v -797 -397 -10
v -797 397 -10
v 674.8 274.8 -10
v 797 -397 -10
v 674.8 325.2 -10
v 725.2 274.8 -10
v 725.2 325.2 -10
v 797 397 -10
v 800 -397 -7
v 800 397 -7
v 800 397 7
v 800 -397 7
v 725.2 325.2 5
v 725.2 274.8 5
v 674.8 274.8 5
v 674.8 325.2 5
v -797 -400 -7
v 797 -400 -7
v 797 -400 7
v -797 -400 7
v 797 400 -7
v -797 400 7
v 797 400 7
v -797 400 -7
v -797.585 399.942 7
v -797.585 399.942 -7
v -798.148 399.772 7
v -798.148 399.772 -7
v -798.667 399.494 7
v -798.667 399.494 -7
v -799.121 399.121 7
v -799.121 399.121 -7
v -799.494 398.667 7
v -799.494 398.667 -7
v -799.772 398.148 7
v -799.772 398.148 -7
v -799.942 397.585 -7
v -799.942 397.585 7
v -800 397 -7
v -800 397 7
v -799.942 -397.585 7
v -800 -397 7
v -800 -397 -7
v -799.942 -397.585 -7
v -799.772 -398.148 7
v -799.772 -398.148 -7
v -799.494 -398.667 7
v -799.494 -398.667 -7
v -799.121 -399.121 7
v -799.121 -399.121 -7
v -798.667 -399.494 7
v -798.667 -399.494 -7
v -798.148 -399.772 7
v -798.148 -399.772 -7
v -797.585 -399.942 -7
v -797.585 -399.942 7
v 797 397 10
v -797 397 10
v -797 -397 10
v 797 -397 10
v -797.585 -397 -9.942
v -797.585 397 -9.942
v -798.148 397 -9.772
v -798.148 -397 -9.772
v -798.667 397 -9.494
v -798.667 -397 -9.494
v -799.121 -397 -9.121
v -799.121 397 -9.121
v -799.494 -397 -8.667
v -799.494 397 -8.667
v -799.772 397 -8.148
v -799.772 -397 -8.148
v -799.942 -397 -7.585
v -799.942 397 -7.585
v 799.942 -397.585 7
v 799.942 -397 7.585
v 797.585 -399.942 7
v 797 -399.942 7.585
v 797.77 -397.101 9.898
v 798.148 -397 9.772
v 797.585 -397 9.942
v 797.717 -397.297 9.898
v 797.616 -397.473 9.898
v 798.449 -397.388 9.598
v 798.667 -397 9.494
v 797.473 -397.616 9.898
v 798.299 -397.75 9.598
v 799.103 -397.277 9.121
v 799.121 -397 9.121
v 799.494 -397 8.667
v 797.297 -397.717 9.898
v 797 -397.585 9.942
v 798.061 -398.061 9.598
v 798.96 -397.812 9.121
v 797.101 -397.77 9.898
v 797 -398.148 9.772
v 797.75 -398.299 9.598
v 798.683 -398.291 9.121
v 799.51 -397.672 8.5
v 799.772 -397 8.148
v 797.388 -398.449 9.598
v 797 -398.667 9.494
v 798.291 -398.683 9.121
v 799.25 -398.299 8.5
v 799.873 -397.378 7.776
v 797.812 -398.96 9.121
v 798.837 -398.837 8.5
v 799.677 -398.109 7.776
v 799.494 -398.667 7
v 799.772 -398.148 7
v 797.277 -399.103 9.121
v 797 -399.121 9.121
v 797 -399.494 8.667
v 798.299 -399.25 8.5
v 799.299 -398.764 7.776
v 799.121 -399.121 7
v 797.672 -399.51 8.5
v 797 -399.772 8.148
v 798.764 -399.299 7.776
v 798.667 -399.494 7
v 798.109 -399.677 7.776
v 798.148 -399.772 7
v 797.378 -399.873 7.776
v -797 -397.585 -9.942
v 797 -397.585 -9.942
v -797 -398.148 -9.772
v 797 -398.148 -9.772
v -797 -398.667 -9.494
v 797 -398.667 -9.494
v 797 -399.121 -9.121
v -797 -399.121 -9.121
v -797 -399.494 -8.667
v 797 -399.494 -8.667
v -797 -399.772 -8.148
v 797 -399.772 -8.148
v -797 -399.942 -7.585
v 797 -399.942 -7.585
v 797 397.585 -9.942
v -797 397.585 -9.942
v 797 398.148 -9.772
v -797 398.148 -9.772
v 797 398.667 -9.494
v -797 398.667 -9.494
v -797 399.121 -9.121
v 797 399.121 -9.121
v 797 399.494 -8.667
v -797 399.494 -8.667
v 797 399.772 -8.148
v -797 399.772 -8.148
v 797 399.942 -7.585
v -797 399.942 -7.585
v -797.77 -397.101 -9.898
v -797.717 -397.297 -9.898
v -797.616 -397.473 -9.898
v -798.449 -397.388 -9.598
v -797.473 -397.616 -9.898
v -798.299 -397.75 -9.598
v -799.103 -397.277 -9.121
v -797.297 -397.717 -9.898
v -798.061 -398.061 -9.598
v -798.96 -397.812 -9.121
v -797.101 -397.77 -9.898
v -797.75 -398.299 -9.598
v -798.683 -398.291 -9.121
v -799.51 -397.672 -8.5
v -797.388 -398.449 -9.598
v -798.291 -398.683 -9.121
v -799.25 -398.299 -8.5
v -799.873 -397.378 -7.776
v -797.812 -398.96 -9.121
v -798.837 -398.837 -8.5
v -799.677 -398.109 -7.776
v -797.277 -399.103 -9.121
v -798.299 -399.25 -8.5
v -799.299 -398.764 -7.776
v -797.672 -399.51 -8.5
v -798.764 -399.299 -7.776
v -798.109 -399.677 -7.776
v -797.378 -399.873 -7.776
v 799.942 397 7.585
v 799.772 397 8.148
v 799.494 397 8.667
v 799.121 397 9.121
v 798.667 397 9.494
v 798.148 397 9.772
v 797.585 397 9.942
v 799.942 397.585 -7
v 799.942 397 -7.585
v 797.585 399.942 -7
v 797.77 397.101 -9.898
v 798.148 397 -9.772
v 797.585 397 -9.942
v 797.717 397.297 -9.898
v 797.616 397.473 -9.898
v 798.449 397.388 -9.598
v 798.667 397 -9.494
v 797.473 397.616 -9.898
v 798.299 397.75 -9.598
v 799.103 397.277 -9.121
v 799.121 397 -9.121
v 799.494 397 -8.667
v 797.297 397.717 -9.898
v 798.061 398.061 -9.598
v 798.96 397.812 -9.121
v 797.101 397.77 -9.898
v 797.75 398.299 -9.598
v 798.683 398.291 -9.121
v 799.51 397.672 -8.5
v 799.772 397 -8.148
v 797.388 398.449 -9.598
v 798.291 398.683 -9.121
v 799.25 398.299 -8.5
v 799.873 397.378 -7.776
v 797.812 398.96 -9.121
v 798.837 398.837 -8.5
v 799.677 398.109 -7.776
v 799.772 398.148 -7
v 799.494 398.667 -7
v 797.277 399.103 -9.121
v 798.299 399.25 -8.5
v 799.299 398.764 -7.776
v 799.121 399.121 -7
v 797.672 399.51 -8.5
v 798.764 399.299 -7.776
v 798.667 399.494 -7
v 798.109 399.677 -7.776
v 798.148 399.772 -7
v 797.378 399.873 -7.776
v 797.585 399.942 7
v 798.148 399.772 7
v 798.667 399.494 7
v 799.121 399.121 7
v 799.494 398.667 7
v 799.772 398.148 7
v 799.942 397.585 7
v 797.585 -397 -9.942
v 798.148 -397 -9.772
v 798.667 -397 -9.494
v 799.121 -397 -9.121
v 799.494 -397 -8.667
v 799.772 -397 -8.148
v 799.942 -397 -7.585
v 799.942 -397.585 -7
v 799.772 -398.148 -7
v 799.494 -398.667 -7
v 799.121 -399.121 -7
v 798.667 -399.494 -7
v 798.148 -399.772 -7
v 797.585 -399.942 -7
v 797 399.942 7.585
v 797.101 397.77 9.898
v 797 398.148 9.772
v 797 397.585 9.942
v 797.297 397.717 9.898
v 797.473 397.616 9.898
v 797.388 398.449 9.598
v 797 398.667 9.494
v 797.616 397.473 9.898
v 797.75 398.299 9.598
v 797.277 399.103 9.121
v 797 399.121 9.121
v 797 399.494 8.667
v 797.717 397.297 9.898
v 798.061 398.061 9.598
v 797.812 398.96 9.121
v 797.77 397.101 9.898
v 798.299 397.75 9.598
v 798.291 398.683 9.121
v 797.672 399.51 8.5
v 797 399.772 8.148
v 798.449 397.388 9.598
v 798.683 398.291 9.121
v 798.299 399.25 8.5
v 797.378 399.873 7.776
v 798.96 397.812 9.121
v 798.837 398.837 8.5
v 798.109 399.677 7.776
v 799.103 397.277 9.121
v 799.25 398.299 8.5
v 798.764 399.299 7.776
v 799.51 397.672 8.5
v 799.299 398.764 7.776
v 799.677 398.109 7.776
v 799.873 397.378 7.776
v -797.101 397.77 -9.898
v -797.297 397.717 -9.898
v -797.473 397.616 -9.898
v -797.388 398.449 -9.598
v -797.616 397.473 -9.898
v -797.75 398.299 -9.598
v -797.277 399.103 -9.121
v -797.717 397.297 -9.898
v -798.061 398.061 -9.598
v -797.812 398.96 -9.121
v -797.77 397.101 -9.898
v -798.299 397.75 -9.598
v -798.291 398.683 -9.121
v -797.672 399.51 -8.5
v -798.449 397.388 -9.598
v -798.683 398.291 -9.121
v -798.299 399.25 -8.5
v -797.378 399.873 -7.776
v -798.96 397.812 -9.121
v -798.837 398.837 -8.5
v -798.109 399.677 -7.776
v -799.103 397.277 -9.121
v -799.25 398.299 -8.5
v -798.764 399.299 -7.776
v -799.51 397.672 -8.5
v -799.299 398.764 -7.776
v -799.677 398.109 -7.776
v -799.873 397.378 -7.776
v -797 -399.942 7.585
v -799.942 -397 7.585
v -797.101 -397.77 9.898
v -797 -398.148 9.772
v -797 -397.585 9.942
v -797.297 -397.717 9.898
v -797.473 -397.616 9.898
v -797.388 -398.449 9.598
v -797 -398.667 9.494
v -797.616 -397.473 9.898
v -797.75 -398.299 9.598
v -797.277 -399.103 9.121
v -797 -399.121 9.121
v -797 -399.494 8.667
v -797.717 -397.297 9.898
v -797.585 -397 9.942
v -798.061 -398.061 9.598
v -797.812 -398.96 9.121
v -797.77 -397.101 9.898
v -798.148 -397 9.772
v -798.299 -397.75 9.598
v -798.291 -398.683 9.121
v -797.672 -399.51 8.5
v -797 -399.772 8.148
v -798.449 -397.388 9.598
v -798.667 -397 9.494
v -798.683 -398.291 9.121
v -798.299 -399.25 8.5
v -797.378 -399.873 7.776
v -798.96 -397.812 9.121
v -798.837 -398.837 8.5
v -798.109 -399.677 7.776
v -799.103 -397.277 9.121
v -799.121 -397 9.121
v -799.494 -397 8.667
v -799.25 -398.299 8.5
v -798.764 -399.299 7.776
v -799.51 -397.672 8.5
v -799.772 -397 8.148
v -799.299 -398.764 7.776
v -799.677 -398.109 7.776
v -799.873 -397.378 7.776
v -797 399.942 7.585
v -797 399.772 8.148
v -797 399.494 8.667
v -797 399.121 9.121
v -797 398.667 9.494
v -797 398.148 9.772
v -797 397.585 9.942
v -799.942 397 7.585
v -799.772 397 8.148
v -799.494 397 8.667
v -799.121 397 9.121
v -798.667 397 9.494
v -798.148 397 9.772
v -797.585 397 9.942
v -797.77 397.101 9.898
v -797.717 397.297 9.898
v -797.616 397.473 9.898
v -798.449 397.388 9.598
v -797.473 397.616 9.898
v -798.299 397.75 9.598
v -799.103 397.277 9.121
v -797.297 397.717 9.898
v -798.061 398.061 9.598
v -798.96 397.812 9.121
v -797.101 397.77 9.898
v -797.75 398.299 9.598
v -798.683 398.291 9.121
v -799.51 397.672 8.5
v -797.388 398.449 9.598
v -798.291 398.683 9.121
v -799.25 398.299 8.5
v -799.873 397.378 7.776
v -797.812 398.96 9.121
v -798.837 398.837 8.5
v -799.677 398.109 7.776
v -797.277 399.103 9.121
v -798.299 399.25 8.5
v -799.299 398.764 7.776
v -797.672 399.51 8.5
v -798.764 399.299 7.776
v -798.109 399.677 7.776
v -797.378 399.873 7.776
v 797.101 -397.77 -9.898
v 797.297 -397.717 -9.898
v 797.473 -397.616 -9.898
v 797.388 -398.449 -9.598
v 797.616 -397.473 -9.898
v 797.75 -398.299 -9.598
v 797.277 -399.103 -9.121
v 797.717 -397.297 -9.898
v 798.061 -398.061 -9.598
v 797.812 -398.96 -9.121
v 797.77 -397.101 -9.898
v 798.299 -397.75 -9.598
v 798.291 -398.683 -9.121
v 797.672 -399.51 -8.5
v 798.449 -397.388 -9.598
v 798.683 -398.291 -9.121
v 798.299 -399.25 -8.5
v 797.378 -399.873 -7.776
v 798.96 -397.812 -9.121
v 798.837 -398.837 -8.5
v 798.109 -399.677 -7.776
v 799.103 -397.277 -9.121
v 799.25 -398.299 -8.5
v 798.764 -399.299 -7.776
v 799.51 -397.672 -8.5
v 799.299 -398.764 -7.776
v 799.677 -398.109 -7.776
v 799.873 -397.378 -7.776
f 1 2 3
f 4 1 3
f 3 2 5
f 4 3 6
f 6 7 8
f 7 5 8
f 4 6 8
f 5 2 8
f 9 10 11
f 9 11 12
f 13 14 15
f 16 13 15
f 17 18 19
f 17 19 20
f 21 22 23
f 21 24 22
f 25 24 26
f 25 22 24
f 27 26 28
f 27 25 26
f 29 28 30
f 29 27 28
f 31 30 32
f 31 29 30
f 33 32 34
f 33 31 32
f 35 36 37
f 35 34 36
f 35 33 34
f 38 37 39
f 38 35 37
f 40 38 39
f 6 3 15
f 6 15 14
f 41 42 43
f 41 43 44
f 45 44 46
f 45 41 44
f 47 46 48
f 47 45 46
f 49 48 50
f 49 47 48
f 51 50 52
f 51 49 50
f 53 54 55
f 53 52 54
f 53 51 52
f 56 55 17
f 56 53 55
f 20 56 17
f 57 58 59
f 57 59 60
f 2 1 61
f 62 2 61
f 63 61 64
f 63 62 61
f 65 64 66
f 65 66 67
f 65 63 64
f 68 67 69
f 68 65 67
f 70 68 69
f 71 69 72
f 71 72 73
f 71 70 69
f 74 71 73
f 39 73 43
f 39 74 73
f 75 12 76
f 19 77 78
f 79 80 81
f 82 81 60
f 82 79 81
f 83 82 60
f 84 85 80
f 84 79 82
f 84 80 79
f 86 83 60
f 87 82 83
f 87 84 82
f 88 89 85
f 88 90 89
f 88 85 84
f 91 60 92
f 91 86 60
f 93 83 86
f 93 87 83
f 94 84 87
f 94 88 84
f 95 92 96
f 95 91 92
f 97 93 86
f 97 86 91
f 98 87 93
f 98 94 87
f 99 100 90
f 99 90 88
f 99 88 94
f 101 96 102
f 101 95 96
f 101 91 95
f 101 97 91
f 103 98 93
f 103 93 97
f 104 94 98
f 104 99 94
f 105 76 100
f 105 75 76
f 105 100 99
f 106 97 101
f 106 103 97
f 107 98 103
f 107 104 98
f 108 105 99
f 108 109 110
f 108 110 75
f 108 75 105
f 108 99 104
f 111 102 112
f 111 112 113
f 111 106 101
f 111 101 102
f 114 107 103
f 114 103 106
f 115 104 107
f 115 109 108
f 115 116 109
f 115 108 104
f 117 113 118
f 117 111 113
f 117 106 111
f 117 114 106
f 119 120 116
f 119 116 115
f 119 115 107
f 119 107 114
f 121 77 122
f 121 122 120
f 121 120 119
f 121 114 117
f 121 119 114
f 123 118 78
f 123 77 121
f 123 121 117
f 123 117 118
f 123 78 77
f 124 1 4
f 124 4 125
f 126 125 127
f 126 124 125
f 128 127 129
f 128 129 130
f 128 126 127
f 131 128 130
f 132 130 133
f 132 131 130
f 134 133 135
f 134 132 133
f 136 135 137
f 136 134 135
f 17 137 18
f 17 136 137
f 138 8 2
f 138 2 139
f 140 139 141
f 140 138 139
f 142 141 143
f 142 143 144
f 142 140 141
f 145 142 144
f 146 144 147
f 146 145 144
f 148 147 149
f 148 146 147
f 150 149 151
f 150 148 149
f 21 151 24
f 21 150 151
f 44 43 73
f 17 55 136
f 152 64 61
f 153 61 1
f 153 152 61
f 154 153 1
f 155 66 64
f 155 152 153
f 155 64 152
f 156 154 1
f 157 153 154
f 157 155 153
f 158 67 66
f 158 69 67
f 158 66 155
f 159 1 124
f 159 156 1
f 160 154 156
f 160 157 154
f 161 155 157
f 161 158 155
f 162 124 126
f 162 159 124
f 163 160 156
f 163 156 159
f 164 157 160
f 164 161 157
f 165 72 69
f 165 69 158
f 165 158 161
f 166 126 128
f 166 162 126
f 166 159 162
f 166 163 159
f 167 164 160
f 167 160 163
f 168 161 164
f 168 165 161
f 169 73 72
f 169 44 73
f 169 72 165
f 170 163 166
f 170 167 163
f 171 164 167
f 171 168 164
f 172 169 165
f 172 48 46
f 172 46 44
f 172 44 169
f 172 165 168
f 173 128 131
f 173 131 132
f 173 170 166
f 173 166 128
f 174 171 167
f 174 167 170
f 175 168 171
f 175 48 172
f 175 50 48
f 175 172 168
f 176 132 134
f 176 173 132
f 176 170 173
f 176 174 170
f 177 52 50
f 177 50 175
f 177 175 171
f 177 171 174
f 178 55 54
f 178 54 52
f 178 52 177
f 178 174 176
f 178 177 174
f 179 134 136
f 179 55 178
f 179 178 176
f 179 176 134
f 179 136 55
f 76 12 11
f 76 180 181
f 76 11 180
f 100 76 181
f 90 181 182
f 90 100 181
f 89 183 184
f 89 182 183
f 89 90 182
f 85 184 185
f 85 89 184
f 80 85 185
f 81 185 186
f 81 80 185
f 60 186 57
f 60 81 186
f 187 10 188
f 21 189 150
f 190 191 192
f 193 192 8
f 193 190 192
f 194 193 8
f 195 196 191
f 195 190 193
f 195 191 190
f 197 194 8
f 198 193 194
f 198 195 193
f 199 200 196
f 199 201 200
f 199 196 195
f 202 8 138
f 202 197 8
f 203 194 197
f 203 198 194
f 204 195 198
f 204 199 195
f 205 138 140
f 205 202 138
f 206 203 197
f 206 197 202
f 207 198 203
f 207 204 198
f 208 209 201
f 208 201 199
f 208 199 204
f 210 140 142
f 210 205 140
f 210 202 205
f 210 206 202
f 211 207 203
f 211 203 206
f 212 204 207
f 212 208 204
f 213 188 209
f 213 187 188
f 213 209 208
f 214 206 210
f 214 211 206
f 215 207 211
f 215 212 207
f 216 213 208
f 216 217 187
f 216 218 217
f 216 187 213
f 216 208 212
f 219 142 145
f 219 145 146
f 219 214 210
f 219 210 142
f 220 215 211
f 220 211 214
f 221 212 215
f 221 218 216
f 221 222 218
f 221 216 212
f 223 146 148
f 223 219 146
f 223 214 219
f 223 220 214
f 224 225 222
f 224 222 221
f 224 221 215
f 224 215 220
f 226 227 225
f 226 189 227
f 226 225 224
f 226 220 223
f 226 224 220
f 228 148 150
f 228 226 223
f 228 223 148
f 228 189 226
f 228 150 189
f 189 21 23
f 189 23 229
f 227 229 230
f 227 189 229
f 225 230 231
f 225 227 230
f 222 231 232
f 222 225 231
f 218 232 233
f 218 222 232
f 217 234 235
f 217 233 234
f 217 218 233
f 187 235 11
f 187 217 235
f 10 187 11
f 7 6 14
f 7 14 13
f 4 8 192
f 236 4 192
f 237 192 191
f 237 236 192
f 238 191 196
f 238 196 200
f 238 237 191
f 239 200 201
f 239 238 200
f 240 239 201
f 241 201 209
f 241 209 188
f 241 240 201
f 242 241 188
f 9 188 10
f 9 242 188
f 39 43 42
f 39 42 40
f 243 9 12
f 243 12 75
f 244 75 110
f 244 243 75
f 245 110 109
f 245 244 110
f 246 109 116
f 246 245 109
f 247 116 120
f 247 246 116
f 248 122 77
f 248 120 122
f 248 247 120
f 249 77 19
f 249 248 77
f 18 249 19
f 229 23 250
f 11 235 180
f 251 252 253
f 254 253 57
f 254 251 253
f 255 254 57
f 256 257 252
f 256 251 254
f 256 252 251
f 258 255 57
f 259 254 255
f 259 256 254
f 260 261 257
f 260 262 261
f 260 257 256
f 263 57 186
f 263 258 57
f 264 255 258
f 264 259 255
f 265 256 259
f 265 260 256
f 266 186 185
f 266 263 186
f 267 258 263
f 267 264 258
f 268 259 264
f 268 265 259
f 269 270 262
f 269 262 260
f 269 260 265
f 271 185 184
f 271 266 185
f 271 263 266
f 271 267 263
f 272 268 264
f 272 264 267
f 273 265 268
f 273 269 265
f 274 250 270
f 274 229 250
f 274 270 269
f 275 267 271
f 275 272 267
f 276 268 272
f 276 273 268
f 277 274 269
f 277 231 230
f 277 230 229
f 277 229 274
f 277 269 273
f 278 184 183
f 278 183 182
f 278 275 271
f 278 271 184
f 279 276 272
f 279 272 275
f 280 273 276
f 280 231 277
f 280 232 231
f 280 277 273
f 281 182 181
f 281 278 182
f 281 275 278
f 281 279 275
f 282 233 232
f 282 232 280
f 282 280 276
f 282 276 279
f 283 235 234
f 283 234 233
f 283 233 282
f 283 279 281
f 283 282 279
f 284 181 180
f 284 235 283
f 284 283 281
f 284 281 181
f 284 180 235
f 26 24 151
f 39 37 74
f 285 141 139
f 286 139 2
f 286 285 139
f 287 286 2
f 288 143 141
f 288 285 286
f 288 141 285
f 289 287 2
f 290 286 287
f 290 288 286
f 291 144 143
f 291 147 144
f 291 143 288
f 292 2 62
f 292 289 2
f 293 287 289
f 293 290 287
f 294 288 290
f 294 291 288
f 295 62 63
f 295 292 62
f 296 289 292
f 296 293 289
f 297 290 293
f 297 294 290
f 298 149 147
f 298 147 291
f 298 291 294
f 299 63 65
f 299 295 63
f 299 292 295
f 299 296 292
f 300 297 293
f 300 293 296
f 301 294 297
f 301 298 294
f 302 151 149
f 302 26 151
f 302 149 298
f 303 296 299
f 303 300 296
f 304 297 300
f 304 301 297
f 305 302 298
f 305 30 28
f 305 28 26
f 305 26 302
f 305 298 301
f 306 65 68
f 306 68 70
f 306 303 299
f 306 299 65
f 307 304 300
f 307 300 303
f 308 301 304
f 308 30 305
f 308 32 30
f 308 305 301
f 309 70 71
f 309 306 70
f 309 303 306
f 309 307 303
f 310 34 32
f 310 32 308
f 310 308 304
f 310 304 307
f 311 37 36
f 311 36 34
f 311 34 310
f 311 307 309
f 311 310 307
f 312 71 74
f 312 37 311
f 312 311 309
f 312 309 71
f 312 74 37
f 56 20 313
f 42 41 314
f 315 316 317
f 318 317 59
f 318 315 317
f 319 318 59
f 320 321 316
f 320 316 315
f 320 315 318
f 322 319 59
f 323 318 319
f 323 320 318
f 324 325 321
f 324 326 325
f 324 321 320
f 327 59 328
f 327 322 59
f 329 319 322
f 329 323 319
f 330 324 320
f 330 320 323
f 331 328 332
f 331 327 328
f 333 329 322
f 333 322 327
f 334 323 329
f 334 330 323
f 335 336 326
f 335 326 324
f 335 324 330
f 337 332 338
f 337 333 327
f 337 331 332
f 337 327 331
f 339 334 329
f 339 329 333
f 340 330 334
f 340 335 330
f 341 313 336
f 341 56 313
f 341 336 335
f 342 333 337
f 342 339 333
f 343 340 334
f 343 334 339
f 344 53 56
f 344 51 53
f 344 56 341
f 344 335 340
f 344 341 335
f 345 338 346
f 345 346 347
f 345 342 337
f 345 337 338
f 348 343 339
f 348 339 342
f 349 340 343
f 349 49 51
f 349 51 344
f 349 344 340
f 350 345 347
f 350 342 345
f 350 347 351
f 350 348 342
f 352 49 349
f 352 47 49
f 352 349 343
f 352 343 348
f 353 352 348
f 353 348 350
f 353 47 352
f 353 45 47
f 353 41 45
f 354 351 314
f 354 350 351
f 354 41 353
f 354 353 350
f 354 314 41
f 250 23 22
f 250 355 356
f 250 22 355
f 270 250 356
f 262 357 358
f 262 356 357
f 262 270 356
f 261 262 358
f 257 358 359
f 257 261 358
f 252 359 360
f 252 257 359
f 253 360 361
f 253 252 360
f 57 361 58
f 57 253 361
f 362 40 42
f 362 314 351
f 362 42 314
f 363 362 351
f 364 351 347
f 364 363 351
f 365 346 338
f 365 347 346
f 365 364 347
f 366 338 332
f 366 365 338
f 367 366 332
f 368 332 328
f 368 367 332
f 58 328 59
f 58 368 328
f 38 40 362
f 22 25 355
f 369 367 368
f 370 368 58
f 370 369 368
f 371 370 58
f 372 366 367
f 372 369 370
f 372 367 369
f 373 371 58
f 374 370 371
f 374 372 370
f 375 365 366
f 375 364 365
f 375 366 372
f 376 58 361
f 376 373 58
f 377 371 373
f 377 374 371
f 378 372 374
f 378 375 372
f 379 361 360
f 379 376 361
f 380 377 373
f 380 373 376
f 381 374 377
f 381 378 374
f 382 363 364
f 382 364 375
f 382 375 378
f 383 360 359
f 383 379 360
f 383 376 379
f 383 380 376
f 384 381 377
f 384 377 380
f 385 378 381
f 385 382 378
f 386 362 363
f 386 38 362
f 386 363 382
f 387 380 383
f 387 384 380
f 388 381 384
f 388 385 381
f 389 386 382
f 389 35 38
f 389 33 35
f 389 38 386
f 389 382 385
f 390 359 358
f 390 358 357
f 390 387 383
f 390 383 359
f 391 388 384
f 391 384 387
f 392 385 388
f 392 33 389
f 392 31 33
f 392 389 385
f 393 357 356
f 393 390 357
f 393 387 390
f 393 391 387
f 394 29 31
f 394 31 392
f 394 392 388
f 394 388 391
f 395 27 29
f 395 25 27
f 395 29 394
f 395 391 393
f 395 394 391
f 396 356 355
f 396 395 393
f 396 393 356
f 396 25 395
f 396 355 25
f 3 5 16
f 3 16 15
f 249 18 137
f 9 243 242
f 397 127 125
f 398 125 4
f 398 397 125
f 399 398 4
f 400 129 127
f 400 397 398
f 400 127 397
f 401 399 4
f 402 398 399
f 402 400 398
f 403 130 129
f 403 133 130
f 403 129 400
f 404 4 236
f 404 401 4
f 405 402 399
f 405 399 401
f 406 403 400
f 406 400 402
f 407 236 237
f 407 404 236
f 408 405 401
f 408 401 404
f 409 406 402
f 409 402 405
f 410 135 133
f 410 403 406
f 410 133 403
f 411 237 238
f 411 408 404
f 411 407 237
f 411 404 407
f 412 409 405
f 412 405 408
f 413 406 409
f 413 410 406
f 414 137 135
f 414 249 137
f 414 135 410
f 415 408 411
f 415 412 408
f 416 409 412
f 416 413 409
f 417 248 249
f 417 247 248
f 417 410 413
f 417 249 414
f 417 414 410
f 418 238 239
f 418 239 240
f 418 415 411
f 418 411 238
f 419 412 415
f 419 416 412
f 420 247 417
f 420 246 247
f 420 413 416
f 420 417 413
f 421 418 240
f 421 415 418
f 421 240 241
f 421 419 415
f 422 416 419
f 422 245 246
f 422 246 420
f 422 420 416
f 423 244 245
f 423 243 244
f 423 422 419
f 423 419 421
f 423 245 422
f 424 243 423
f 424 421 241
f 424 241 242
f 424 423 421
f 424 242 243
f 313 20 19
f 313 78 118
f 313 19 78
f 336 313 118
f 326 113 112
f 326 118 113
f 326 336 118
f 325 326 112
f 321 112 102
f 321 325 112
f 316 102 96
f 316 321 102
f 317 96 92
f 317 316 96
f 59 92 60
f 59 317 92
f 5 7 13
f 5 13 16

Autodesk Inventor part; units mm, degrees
sketch "Tampo_sketch" plane through (0, 0, 0) normal (0, 0, 1) x (1, 0, 0)
  line L0 (-800, 400) -> (800, 400)
  line L1 (800, 400) -> (800, -400)
  line L2 (800, -400) -> (-800, -400)
  line L3 (-800, -400) -> (-800, 400)
  line L4 (-800, 400) -> (800, -400) construction
  line L5 (800, 400) -> (-800, -400) construction
  point P0 (0, 0)
  point P1 (0, 0)
  dimension "d0" = 1600
  dimension "d1" = 800
extrude "Tampo_Extrusion" add sketch "Tampo_sketch" along normal mid plane 20
fillet "Fillet1" radius 3 12 edges at (800, 400, 0) (-800, 400, 0) (-800, -400, 0) (800, -400, 0) (0, -400, 10) (0, -400, -10) (800, 0, 10) (800, 0, -10) (-800, 0, 10) (-800, 0, -10) (0, 400, 10) (0, 400, -10)
sketch "perna_encaixe_Sketch2" plane through (0, 0, -10) normal (0, 0, -1) x (-1, 0, 0)
  line L0 (-674.8, 274.8) -> (-725.2, 274.8)
  line L1 (-725.2, 274.8) -> (-725.2, 325.2)
  line L2 (-725.2, 325.2) -> (-674.8, 325.2)
  line L3 (-674.8, 325.2) -> (-674.8, 274.8)
  line L4 (-674.8, 274.8) -> (-725.2, 325.2) construction
  line L5 (-725.2, 274.8) -> (-674.8, 325.2) construction
  point P0 (0, 0)
  point P1 (-700, 300)
  dimension "d5" = 300
  dimension "d6" = 700
  dimension "d7" = 50.4
extrude "perna_encaixe_rasgo" cut sketch "perna_encaixe_Sketch2" against normal blind 15
properties part number "Tampo" material "Wood (Oak)"
